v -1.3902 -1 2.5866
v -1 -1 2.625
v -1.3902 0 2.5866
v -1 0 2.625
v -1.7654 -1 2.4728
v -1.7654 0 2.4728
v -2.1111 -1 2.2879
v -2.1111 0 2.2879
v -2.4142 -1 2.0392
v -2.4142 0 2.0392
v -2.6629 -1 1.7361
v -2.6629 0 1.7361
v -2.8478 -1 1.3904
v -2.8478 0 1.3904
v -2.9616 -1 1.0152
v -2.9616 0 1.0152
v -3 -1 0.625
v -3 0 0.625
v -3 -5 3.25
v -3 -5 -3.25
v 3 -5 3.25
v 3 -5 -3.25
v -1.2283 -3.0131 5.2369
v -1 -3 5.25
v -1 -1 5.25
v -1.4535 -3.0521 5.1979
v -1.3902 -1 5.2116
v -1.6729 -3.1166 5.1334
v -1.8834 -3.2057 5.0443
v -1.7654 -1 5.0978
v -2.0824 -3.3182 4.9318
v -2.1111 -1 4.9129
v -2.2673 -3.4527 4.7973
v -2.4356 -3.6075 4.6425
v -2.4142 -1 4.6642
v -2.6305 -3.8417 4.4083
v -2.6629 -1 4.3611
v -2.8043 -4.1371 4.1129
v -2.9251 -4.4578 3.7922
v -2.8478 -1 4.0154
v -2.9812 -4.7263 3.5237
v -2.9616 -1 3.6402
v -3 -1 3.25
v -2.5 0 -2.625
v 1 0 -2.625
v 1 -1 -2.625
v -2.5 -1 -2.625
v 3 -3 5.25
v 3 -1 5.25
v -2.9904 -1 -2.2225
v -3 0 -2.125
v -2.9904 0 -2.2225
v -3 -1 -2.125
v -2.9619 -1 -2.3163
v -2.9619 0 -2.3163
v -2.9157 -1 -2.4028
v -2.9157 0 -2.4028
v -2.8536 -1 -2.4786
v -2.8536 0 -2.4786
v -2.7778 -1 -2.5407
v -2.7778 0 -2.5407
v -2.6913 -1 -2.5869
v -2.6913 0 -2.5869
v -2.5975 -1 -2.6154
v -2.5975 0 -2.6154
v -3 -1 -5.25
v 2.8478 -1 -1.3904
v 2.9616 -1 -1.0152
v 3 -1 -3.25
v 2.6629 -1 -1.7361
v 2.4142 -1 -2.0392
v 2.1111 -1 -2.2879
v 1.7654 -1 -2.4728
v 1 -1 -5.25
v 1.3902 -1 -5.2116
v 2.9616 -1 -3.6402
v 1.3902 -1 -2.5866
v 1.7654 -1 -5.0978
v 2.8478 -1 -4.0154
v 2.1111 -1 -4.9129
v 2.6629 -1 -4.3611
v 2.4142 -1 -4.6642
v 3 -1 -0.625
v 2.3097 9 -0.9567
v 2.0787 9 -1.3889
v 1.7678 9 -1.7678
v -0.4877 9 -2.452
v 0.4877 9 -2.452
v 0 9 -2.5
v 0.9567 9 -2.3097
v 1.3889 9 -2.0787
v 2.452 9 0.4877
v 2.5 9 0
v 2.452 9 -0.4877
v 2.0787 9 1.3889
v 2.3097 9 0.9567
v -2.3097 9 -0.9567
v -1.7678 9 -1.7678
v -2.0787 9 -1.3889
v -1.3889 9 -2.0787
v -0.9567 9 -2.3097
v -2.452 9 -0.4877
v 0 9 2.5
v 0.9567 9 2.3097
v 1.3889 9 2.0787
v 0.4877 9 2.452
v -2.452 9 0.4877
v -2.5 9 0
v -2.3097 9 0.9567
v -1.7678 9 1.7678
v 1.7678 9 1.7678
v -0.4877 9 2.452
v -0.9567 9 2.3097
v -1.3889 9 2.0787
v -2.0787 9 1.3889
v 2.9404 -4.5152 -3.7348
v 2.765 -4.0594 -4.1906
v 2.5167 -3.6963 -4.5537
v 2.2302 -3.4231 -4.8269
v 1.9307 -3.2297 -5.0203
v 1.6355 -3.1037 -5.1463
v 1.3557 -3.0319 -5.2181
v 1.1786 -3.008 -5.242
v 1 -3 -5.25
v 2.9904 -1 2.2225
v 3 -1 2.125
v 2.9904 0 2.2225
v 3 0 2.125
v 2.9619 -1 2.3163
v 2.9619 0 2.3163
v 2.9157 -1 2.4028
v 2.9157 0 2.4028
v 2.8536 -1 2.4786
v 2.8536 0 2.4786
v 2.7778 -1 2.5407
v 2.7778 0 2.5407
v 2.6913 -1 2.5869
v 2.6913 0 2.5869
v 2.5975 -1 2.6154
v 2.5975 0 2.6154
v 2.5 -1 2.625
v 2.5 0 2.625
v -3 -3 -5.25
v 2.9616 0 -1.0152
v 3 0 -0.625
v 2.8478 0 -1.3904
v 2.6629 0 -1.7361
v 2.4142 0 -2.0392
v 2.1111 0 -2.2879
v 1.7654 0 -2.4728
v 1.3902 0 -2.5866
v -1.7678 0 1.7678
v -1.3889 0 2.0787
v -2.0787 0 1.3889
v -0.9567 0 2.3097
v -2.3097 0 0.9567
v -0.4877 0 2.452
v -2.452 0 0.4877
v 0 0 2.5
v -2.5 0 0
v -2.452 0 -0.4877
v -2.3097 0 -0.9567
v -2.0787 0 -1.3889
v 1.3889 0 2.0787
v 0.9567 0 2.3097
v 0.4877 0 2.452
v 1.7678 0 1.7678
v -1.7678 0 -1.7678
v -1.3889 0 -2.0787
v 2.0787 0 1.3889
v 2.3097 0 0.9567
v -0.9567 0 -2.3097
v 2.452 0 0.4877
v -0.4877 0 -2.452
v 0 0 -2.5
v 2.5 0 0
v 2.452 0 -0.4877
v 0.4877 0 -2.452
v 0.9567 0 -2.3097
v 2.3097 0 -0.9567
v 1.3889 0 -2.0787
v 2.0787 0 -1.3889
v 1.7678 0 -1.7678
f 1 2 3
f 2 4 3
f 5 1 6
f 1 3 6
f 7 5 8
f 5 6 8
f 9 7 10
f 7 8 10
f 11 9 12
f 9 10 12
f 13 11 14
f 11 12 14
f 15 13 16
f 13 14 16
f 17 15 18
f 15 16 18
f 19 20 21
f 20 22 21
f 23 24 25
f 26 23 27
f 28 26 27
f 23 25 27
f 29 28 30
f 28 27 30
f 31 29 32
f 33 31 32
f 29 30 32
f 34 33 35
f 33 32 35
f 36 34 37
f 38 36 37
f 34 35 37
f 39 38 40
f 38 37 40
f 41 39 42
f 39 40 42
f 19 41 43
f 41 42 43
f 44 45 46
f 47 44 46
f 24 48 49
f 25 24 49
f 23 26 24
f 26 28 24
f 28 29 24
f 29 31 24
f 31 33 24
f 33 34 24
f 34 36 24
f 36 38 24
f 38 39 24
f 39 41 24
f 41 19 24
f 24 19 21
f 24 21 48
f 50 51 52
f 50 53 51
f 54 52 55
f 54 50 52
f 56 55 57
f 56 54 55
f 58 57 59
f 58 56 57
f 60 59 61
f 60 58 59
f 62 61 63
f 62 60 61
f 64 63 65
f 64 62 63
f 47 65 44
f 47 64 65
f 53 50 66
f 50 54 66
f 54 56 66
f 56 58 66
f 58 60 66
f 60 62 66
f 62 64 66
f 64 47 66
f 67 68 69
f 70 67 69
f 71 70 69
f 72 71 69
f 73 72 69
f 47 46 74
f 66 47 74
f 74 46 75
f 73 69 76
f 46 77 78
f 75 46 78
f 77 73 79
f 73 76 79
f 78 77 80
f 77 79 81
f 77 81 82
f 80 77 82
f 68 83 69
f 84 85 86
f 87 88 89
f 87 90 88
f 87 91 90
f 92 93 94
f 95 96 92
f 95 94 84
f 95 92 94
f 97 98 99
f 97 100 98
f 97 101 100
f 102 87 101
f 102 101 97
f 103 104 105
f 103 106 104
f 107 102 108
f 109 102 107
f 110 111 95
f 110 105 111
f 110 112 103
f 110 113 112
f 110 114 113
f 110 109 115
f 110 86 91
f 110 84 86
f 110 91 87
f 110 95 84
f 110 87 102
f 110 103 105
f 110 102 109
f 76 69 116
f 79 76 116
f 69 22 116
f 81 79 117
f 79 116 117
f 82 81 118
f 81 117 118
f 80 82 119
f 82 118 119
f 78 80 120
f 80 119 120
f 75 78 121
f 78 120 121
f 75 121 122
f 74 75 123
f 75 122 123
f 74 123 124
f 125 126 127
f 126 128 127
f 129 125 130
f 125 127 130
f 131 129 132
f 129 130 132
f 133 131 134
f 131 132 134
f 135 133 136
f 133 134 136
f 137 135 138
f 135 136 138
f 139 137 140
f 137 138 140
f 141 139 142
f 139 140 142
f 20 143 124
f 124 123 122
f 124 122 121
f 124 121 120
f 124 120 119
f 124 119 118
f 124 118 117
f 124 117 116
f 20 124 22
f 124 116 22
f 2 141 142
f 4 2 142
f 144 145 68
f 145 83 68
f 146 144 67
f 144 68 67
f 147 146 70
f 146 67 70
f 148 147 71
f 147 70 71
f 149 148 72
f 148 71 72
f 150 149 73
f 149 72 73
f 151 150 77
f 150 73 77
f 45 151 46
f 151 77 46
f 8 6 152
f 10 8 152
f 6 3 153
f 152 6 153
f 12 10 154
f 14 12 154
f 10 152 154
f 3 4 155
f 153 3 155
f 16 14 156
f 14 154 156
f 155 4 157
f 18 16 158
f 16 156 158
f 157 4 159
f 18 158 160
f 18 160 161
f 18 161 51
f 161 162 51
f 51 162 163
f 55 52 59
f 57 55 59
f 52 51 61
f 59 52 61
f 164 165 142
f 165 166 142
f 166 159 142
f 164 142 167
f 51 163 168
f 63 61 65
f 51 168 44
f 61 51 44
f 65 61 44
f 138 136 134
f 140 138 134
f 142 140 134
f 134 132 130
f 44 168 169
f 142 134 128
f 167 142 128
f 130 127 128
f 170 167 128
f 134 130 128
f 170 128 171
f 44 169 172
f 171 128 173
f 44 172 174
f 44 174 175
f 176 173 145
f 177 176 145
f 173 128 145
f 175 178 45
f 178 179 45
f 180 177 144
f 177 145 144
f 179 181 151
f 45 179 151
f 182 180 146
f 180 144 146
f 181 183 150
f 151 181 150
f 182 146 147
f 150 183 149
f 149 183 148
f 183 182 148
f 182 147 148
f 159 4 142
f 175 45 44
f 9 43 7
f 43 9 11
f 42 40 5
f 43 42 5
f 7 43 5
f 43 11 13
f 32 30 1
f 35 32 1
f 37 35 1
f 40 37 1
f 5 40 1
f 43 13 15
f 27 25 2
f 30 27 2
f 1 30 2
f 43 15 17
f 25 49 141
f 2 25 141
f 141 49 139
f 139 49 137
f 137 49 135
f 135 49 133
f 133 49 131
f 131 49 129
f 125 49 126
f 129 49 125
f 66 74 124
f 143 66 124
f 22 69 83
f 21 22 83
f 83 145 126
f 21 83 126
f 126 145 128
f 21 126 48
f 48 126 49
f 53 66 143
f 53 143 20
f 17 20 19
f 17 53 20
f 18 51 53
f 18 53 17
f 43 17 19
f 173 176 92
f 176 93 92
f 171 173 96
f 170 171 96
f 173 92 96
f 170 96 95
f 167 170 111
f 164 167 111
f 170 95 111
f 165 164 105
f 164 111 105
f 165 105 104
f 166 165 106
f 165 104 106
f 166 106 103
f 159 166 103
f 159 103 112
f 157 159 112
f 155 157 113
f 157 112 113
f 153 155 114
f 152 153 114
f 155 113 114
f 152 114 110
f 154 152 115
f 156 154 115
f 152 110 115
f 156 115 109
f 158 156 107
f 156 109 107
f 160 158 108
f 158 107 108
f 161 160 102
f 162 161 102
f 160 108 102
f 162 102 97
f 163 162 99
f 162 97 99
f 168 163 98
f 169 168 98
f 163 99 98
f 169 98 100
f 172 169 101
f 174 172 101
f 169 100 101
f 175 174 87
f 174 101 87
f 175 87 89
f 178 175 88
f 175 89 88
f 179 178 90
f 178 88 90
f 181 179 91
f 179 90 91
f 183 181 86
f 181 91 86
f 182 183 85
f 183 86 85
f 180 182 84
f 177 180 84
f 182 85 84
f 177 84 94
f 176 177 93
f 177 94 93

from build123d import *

# Parameters (mm, degrees)
BOSS_EXTRUDE1_DEPTH = 3
FILLET1_R           = 2
FILLET2_R           = 2
FILLET3_R           = 0.5
SKETCH2_W           = 2.5
SKETCH2_H           = 9


with BuildPart() as part:
    # Sketch1 → Boss-Extrude1 (new body, symmetric)
    with BuildSketch(Plane(origin=(0, 0, 0), x_dir=(0, 0, -1), z_dir=(1, 0, 0))):
        Polygon((-2.625, 0), (2.625, 0), (2.625, -1), (5.25, -1), (5.25, -3), (3.25, -5), (-3.25, -5), (-5.25, -3), (-5.25, -1), (-2.625, -1), align=None)
    extrude(amount=BOSS_EXTRUDE1_DEPTH, both=True)

    # Fillet1
    fillet1_edges = [part.edges().sort_by_distance(p)[0] for p in [
        (3, -2, -5.25),
        (-3, -2, 5.25),
    ]]
    fillet(fillet1_edges, radius=FILLET1_R)

    # Fillet2
    fillet2_edges = [part.edges().sort_by_distance(p)[0] for p in [
        (-3, -0.5, 2.625),
        (3, -0.5, -2.625),
    ]]
    fillet(fillet2_edges, radius=FILLET2_R)

    # Fillet3
    fillet3_edges = [part.edges().sort_by_distance(p)[0] for p in [
        (3, -0.5, 2.625),
        (-3, -0.5, -2.625),
    ]]
    fillet(fillet3_edges, radius=FILLET3_R)

    # Sketch2 → Revolve1 (revolve)
    with BuildSketch(Plane.XY):
        with Locations((1.25, 4.5)):
            Rectangle(SKETCH2_W, SKETCH2_H)
    revolve(axis=Axis((0, 55, 0), (0, -1, 0)))


solid = part.part
